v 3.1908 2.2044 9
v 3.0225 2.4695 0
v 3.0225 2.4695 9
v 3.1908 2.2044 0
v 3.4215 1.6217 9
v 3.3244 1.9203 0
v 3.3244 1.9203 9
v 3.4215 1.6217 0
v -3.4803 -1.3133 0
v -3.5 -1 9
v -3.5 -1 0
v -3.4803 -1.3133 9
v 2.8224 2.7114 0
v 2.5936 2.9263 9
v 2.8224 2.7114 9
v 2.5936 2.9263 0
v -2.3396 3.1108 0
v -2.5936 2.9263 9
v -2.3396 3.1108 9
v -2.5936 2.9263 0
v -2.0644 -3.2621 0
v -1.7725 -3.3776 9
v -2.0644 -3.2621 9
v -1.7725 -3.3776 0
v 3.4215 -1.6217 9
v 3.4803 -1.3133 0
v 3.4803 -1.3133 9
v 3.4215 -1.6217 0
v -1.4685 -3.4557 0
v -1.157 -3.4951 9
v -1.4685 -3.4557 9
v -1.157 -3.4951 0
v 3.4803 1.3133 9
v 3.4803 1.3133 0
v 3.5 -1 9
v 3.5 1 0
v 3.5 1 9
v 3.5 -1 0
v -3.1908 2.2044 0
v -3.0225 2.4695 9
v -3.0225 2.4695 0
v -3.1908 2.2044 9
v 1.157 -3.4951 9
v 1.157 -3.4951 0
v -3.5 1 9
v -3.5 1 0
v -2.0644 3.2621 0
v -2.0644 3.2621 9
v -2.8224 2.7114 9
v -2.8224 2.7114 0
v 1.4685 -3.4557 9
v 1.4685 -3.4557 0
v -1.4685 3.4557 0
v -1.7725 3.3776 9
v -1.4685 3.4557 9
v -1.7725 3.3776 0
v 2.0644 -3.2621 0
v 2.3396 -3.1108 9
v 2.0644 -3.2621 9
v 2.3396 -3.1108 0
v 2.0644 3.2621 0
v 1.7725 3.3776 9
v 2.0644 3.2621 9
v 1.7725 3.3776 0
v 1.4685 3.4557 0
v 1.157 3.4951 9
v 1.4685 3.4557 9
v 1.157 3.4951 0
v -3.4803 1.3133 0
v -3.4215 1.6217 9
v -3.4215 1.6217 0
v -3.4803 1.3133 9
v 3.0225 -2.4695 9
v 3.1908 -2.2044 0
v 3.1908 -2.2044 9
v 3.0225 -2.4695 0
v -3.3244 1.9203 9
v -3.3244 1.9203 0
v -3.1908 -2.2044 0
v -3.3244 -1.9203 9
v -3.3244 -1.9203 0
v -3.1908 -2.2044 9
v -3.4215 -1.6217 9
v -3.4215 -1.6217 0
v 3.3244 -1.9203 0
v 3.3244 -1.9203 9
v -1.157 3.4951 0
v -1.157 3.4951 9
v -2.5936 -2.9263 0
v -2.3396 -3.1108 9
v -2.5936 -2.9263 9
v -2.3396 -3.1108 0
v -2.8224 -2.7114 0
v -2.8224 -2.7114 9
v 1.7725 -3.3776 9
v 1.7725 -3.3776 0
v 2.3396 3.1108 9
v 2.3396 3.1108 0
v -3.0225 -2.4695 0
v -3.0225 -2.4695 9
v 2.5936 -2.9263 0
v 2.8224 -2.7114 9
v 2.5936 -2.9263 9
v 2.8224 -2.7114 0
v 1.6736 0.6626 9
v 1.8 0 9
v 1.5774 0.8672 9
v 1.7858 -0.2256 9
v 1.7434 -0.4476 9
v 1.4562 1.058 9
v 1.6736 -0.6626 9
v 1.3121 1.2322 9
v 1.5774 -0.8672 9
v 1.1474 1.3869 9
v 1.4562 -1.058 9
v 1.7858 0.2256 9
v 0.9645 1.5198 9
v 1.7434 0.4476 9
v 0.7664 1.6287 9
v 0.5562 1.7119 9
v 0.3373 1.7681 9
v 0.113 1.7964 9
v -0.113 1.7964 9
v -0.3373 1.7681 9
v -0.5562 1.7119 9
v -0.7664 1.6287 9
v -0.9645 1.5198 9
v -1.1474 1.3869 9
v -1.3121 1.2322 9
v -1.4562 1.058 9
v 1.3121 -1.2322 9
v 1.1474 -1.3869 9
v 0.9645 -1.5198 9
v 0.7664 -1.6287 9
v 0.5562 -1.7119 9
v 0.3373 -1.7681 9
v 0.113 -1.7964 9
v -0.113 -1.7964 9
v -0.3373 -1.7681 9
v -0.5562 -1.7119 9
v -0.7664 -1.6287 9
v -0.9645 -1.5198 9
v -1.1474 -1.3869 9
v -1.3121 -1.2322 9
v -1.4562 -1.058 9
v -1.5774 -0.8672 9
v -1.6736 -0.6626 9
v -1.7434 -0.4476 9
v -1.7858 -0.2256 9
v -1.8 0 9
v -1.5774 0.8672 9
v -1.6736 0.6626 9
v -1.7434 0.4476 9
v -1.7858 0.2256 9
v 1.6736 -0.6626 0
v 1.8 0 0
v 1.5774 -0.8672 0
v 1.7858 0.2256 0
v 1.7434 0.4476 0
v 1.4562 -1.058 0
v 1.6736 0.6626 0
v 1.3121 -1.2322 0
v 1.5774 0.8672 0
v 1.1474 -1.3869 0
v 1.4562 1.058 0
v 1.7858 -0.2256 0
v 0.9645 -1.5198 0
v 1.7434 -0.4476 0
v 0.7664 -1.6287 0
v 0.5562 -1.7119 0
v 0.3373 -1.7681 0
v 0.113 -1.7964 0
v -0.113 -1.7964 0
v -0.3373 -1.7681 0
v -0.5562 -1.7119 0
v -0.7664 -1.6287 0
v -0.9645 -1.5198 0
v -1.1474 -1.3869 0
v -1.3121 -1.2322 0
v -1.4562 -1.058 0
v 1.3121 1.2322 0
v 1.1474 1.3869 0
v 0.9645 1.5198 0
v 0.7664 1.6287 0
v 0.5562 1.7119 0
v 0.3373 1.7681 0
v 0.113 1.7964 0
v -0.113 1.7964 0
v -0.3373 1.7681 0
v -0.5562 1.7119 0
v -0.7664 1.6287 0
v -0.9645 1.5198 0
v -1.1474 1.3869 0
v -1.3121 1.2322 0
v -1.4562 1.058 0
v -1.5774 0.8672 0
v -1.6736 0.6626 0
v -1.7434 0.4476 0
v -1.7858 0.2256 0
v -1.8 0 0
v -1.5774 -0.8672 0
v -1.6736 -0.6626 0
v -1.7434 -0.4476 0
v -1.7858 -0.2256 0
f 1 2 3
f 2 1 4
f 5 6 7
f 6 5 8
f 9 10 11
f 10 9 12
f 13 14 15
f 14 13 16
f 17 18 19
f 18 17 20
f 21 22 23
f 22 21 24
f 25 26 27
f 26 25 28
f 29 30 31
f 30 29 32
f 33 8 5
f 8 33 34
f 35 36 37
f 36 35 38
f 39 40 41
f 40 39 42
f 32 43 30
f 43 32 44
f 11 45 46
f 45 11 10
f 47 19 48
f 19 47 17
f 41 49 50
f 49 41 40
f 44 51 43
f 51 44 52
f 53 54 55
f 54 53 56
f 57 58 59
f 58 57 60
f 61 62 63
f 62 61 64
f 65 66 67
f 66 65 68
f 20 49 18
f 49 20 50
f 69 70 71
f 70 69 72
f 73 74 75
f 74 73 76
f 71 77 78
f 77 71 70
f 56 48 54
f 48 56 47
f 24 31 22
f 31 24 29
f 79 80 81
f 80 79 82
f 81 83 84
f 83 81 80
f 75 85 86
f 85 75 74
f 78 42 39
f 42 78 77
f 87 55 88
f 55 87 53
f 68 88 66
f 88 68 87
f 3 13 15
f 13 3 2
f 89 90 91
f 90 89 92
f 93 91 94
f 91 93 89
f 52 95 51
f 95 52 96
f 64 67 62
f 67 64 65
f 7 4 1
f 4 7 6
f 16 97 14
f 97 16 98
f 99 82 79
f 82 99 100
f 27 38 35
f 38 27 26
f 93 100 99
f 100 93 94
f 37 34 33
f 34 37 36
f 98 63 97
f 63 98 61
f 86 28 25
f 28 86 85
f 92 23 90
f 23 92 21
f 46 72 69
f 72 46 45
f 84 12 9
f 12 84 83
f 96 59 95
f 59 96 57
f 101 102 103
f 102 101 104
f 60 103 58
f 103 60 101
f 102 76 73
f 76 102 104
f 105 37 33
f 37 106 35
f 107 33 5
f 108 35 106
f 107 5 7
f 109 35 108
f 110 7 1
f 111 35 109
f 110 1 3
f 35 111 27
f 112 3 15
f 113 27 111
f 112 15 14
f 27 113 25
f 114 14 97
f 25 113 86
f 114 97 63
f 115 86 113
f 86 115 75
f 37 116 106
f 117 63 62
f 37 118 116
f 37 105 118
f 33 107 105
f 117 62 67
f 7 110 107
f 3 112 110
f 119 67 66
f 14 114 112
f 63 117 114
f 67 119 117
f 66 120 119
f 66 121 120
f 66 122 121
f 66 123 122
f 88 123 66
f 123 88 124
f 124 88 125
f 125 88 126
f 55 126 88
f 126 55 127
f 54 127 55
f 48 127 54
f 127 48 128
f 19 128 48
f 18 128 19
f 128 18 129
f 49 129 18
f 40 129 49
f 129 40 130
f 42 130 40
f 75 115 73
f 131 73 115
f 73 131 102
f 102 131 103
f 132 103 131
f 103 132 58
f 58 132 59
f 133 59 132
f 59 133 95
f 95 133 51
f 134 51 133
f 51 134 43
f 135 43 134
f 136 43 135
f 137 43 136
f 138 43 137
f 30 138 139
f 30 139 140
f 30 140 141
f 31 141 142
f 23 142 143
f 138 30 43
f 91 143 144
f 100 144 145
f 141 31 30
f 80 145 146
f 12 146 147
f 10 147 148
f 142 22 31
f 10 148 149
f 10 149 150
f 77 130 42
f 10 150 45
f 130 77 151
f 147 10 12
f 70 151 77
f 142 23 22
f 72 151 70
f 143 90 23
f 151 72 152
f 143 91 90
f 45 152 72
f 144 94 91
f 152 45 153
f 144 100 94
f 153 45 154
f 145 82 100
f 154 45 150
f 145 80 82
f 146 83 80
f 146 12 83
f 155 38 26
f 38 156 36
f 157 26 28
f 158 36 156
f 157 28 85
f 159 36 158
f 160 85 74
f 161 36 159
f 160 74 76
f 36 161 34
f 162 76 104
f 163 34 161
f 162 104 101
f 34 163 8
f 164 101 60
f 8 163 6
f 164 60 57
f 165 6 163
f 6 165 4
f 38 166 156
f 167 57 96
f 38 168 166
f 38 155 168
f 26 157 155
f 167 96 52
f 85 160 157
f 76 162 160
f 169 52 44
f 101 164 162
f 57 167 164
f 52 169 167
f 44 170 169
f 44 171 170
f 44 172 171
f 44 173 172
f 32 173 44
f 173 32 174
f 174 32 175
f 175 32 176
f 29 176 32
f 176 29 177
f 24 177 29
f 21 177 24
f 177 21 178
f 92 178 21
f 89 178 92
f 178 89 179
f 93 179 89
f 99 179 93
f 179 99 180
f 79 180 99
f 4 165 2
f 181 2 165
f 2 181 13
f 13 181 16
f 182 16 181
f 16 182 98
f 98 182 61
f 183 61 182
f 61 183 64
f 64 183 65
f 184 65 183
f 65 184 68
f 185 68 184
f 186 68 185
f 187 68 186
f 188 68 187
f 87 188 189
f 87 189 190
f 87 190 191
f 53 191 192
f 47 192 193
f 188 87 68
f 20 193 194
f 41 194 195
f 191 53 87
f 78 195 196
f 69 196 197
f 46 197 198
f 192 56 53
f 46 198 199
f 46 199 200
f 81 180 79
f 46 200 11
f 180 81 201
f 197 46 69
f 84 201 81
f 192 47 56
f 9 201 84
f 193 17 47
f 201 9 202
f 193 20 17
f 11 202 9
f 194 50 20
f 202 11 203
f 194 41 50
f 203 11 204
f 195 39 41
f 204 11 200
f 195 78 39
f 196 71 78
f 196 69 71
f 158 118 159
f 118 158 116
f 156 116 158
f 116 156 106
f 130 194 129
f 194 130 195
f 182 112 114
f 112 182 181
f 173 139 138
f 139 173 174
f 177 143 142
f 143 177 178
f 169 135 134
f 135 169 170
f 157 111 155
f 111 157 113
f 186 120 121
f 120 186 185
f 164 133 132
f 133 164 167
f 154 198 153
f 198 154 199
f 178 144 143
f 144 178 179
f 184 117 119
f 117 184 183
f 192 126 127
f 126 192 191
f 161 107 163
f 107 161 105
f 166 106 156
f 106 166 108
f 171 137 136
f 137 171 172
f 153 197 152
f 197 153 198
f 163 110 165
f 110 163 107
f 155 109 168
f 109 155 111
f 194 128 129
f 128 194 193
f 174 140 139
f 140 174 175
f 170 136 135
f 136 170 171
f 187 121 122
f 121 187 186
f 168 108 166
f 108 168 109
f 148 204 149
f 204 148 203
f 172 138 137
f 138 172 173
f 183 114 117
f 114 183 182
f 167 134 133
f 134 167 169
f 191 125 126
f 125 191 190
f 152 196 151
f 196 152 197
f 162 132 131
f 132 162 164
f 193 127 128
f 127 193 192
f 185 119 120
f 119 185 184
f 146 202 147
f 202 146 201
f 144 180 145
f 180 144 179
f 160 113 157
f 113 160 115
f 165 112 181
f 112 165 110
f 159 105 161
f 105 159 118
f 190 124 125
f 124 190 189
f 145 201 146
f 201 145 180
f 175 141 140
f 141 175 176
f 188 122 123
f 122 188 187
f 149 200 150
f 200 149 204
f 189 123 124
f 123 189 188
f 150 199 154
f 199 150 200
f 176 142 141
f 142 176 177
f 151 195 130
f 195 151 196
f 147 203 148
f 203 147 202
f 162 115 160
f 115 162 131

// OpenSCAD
$fn = 50;


difference() {
	union() {
		translate(v = [0, 0, 0]) {
			rotate(a = [0, 0, 0]) {
				hull() {
					translate(v = [-1.0000000000, 1.0000000000, 0]) {
						rotate(a = [0, 0, 0]) {
							translate(v = [0, 0, 0]) {
								rotate(a = [0, 0, 0]) {
									cylinder(h = 9, r = 2.5000000000);
								}
							}
						}
					}
					translate(v = [1.0000000000, 1.0000000000, 0]) {
						rotate(a = [0, 0, 0]) {
							translate(v = [0, 0, 0]) {
								rotate(a = [0, 0, 0]) {
									cylinder(h = 9, r = 2.5000000000);
								}
							}
						}
					}
					translate(v = [-1.0000000000, -1.0000000000, 0]) {
						rotate(a = [0, 0, 0]) {
							translate(v = [0, 0, 0]) {
								rotate(a = [0, 0, 0]) {
									cylinder(h = 9, r = 2.5000000000);
								}
							}
						}
					}
					translate(v = [1.0000000000, -1.0000000000, 0]) {
						rotate(a = [0, 0, 0]) {
							translate(v = [0, 0, 0]) {
								rotate(a = [0, 0, 0]) {
									cylinder(h = 9, r = 2.5000000000);
								}
							}
						}
					}
				}
			}
		}
	}
	union() {
		translate(v = [0.0000000000, 0.0000000000, 0]) {
			rotate(a = [0, 0, 0]) {
				translate(v = [0, 0, -50]) {
					rotate(a = [0, 0, 0]) {
						cylinder(h = 100, r = 1.8000000000);
					}
				}
			}
		}
	}
}
